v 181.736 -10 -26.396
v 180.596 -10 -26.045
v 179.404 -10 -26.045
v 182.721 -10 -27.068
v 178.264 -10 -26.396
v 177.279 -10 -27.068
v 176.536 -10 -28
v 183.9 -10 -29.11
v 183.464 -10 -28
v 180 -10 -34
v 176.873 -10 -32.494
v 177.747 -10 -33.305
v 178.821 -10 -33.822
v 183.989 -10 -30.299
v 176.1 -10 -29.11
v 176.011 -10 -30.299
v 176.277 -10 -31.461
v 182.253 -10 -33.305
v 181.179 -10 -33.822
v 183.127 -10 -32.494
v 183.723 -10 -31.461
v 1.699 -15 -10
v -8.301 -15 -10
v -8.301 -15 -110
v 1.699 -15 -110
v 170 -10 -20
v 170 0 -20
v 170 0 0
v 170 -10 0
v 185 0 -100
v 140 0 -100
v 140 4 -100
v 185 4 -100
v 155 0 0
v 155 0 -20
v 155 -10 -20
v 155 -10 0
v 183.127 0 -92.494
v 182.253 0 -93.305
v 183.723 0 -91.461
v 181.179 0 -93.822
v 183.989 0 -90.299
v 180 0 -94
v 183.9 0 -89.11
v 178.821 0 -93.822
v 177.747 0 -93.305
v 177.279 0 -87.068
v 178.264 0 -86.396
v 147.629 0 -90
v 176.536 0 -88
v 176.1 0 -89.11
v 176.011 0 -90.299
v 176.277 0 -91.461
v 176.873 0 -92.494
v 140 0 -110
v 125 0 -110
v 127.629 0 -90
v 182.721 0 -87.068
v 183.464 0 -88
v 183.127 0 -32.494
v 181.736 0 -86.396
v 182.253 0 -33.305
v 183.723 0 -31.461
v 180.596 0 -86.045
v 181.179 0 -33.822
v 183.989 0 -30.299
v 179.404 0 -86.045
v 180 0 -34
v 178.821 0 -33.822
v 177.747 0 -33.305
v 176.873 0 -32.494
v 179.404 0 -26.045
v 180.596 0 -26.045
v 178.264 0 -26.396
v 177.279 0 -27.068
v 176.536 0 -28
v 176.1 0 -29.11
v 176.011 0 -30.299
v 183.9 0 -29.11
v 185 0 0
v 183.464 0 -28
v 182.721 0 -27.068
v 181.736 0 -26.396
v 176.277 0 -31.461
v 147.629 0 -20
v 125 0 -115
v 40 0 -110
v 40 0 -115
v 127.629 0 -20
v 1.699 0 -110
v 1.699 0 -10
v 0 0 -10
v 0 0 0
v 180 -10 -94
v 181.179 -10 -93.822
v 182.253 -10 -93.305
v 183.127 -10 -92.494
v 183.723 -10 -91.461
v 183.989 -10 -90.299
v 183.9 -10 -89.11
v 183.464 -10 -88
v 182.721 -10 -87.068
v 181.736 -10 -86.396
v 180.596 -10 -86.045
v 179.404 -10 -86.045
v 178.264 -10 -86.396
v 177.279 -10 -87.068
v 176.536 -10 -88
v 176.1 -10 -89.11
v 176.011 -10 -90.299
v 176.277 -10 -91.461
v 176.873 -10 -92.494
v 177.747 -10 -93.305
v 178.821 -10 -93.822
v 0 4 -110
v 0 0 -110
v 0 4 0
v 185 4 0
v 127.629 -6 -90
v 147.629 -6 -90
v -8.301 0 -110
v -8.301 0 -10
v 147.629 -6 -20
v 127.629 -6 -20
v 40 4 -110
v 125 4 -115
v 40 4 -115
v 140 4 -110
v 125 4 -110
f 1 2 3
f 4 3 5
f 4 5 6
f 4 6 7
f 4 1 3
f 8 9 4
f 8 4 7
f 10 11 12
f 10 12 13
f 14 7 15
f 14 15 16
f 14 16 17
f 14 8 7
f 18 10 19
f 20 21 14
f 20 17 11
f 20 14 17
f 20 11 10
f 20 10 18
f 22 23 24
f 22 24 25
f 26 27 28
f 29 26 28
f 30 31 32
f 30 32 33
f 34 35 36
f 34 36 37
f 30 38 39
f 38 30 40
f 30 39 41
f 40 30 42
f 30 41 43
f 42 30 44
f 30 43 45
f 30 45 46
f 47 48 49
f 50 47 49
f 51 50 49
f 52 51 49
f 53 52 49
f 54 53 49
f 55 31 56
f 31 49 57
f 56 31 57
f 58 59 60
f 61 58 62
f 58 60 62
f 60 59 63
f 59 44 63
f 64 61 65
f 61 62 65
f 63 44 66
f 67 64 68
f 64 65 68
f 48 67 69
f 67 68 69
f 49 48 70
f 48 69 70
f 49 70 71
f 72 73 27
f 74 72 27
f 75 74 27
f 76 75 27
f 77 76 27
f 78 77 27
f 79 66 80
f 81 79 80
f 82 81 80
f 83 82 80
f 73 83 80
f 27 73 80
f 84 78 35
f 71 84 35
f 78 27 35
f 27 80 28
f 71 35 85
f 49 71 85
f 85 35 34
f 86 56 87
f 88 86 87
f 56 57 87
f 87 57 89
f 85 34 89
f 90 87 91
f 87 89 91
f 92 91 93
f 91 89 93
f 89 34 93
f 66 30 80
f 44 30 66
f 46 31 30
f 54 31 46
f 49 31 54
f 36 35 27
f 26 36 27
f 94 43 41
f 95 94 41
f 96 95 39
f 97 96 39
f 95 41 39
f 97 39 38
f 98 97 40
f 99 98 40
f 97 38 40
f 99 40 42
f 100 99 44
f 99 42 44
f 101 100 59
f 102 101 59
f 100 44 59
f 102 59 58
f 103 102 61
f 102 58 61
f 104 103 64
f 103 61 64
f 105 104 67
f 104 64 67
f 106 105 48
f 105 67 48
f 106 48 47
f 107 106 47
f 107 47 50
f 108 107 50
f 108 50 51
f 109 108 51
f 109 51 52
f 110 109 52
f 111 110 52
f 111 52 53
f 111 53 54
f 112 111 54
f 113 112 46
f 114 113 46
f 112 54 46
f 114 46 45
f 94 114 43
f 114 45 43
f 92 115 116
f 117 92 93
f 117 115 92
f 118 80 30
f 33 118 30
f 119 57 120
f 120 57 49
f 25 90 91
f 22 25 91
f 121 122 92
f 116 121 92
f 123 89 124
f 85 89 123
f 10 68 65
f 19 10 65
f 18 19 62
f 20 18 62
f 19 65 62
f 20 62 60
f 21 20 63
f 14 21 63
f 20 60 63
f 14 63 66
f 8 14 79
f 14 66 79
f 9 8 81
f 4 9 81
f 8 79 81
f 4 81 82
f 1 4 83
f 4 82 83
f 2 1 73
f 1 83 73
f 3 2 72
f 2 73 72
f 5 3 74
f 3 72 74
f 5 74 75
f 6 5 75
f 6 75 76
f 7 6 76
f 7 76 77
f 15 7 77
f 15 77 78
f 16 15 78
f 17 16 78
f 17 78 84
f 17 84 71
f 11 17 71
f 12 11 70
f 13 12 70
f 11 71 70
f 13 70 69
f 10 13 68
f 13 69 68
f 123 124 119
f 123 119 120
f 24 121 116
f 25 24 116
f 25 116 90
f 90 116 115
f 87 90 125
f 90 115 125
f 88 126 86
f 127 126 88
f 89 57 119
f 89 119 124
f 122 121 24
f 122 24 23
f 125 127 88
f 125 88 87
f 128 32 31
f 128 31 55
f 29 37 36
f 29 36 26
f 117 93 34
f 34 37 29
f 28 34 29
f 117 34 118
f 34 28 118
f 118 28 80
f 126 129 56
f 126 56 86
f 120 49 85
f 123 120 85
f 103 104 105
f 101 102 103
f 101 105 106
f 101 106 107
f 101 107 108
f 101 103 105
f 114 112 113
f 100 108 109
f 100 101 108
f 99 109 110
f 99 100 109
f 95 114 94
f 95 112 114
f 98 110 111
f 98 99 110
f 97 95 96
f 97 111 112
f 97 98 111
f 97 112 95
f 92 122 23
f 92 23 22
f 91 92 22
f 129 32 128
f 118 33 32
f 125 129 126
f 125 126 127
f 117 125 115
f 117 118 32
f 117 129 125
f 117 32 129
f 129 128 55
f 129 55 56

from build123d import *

# Parameters (mm, degrees)
SKETCH1_W           = 185
SKETCH1_H           = 100
BOSS_EXTRUDE1_DEPTH = 4
BOSS_EXTRUDE2_DEPTH = 4
SKETCH3_W           = 10
SKETCH3_H           = 100
BOSS_EXTRUDE3_DEPTH = 15
SKETCH4_W           = 20
SKETCH4_H           = 70
BOSS_EXTRUDE4_DEPTH = 6
SKETCH5_W           = 15
SKETCH5_H           = 20
BOSS_EXTRUDE5_DEPTH = 10
SKETCH6_R           = 4
BOSS_EXTRUDE6_DEPTH = 10


with BuildPart() as part:
    # Sketch1 → Boss-Extrude1 (new body)
    with BuildSketch(Plane(origin=(0, 0, 0), x_dir=(1, 0, 0), z_dir=(0, 1, 0))):
        with Locations((92.5, 50)):
            Rectangle(SKETCH1_W, SKETCH1_H)
    extrude(amount=BOSS_EXTRUDE1_DEPTH)

    # Sketch2 → Boss-Extrude2 (add)
    with BuildSketch(Plane(origin=(0, 4, 0), x_dir=(-1, 0, 0), z_dir=(0, 1, 0))):
        Polygon((-40, -115), (-40, -110), (0, -110), (0, -100), (-140, -100), (-140, -110), (-125, -110), (-125, -115), align=None)
    extrude(amount=-BOSS_EXTRUDE2_DEPTH)

    # Sketch3 → Boss-Extrude3 (add)
    with BuildSketch(Plane.XZ):
        with Locations((-3.300721775, -60)):
            Rectangle(SKETCH3_W, SKETCH3_H)
    extrude(amount=BOSS_EXTRUDE3_DEPTH)

    # Sketch4 → Boss-Extrude4 (add)
    with BuildSketch(Plane.XZ):
        with Locations((137.629312938, -55)):
            Rectangle(SKETCH4_W, SKETCH4_H)
    extrude(amount=BOSS_EXTRUDE4_DEPTH)

    # Sketch5 → Boss-Extrude5 (add)
    with BuildSketch(Plane.XZ):
        with Locations((162.5, -10)):
            Rectangle(SKETCH5_W, SKETCH5_H)
    extrude(amount=BOSS_EXTRUDE5_DEPTH)

    # Sketch6 → Boss-Extrude6 (add)
    with BuildSketch(Plane.XZ):
        with Locations(Location((180, -30, 0), (0, 0, 270))):
            Circle(SKETCH6_R)
        with Locations(Location((180, -90, 0), (0, 0, 270))):
            Circle(SKETCH6_R)
    extrude(amount=BOSS_EXTRUDE6_DEPTH)


solid = part.part
